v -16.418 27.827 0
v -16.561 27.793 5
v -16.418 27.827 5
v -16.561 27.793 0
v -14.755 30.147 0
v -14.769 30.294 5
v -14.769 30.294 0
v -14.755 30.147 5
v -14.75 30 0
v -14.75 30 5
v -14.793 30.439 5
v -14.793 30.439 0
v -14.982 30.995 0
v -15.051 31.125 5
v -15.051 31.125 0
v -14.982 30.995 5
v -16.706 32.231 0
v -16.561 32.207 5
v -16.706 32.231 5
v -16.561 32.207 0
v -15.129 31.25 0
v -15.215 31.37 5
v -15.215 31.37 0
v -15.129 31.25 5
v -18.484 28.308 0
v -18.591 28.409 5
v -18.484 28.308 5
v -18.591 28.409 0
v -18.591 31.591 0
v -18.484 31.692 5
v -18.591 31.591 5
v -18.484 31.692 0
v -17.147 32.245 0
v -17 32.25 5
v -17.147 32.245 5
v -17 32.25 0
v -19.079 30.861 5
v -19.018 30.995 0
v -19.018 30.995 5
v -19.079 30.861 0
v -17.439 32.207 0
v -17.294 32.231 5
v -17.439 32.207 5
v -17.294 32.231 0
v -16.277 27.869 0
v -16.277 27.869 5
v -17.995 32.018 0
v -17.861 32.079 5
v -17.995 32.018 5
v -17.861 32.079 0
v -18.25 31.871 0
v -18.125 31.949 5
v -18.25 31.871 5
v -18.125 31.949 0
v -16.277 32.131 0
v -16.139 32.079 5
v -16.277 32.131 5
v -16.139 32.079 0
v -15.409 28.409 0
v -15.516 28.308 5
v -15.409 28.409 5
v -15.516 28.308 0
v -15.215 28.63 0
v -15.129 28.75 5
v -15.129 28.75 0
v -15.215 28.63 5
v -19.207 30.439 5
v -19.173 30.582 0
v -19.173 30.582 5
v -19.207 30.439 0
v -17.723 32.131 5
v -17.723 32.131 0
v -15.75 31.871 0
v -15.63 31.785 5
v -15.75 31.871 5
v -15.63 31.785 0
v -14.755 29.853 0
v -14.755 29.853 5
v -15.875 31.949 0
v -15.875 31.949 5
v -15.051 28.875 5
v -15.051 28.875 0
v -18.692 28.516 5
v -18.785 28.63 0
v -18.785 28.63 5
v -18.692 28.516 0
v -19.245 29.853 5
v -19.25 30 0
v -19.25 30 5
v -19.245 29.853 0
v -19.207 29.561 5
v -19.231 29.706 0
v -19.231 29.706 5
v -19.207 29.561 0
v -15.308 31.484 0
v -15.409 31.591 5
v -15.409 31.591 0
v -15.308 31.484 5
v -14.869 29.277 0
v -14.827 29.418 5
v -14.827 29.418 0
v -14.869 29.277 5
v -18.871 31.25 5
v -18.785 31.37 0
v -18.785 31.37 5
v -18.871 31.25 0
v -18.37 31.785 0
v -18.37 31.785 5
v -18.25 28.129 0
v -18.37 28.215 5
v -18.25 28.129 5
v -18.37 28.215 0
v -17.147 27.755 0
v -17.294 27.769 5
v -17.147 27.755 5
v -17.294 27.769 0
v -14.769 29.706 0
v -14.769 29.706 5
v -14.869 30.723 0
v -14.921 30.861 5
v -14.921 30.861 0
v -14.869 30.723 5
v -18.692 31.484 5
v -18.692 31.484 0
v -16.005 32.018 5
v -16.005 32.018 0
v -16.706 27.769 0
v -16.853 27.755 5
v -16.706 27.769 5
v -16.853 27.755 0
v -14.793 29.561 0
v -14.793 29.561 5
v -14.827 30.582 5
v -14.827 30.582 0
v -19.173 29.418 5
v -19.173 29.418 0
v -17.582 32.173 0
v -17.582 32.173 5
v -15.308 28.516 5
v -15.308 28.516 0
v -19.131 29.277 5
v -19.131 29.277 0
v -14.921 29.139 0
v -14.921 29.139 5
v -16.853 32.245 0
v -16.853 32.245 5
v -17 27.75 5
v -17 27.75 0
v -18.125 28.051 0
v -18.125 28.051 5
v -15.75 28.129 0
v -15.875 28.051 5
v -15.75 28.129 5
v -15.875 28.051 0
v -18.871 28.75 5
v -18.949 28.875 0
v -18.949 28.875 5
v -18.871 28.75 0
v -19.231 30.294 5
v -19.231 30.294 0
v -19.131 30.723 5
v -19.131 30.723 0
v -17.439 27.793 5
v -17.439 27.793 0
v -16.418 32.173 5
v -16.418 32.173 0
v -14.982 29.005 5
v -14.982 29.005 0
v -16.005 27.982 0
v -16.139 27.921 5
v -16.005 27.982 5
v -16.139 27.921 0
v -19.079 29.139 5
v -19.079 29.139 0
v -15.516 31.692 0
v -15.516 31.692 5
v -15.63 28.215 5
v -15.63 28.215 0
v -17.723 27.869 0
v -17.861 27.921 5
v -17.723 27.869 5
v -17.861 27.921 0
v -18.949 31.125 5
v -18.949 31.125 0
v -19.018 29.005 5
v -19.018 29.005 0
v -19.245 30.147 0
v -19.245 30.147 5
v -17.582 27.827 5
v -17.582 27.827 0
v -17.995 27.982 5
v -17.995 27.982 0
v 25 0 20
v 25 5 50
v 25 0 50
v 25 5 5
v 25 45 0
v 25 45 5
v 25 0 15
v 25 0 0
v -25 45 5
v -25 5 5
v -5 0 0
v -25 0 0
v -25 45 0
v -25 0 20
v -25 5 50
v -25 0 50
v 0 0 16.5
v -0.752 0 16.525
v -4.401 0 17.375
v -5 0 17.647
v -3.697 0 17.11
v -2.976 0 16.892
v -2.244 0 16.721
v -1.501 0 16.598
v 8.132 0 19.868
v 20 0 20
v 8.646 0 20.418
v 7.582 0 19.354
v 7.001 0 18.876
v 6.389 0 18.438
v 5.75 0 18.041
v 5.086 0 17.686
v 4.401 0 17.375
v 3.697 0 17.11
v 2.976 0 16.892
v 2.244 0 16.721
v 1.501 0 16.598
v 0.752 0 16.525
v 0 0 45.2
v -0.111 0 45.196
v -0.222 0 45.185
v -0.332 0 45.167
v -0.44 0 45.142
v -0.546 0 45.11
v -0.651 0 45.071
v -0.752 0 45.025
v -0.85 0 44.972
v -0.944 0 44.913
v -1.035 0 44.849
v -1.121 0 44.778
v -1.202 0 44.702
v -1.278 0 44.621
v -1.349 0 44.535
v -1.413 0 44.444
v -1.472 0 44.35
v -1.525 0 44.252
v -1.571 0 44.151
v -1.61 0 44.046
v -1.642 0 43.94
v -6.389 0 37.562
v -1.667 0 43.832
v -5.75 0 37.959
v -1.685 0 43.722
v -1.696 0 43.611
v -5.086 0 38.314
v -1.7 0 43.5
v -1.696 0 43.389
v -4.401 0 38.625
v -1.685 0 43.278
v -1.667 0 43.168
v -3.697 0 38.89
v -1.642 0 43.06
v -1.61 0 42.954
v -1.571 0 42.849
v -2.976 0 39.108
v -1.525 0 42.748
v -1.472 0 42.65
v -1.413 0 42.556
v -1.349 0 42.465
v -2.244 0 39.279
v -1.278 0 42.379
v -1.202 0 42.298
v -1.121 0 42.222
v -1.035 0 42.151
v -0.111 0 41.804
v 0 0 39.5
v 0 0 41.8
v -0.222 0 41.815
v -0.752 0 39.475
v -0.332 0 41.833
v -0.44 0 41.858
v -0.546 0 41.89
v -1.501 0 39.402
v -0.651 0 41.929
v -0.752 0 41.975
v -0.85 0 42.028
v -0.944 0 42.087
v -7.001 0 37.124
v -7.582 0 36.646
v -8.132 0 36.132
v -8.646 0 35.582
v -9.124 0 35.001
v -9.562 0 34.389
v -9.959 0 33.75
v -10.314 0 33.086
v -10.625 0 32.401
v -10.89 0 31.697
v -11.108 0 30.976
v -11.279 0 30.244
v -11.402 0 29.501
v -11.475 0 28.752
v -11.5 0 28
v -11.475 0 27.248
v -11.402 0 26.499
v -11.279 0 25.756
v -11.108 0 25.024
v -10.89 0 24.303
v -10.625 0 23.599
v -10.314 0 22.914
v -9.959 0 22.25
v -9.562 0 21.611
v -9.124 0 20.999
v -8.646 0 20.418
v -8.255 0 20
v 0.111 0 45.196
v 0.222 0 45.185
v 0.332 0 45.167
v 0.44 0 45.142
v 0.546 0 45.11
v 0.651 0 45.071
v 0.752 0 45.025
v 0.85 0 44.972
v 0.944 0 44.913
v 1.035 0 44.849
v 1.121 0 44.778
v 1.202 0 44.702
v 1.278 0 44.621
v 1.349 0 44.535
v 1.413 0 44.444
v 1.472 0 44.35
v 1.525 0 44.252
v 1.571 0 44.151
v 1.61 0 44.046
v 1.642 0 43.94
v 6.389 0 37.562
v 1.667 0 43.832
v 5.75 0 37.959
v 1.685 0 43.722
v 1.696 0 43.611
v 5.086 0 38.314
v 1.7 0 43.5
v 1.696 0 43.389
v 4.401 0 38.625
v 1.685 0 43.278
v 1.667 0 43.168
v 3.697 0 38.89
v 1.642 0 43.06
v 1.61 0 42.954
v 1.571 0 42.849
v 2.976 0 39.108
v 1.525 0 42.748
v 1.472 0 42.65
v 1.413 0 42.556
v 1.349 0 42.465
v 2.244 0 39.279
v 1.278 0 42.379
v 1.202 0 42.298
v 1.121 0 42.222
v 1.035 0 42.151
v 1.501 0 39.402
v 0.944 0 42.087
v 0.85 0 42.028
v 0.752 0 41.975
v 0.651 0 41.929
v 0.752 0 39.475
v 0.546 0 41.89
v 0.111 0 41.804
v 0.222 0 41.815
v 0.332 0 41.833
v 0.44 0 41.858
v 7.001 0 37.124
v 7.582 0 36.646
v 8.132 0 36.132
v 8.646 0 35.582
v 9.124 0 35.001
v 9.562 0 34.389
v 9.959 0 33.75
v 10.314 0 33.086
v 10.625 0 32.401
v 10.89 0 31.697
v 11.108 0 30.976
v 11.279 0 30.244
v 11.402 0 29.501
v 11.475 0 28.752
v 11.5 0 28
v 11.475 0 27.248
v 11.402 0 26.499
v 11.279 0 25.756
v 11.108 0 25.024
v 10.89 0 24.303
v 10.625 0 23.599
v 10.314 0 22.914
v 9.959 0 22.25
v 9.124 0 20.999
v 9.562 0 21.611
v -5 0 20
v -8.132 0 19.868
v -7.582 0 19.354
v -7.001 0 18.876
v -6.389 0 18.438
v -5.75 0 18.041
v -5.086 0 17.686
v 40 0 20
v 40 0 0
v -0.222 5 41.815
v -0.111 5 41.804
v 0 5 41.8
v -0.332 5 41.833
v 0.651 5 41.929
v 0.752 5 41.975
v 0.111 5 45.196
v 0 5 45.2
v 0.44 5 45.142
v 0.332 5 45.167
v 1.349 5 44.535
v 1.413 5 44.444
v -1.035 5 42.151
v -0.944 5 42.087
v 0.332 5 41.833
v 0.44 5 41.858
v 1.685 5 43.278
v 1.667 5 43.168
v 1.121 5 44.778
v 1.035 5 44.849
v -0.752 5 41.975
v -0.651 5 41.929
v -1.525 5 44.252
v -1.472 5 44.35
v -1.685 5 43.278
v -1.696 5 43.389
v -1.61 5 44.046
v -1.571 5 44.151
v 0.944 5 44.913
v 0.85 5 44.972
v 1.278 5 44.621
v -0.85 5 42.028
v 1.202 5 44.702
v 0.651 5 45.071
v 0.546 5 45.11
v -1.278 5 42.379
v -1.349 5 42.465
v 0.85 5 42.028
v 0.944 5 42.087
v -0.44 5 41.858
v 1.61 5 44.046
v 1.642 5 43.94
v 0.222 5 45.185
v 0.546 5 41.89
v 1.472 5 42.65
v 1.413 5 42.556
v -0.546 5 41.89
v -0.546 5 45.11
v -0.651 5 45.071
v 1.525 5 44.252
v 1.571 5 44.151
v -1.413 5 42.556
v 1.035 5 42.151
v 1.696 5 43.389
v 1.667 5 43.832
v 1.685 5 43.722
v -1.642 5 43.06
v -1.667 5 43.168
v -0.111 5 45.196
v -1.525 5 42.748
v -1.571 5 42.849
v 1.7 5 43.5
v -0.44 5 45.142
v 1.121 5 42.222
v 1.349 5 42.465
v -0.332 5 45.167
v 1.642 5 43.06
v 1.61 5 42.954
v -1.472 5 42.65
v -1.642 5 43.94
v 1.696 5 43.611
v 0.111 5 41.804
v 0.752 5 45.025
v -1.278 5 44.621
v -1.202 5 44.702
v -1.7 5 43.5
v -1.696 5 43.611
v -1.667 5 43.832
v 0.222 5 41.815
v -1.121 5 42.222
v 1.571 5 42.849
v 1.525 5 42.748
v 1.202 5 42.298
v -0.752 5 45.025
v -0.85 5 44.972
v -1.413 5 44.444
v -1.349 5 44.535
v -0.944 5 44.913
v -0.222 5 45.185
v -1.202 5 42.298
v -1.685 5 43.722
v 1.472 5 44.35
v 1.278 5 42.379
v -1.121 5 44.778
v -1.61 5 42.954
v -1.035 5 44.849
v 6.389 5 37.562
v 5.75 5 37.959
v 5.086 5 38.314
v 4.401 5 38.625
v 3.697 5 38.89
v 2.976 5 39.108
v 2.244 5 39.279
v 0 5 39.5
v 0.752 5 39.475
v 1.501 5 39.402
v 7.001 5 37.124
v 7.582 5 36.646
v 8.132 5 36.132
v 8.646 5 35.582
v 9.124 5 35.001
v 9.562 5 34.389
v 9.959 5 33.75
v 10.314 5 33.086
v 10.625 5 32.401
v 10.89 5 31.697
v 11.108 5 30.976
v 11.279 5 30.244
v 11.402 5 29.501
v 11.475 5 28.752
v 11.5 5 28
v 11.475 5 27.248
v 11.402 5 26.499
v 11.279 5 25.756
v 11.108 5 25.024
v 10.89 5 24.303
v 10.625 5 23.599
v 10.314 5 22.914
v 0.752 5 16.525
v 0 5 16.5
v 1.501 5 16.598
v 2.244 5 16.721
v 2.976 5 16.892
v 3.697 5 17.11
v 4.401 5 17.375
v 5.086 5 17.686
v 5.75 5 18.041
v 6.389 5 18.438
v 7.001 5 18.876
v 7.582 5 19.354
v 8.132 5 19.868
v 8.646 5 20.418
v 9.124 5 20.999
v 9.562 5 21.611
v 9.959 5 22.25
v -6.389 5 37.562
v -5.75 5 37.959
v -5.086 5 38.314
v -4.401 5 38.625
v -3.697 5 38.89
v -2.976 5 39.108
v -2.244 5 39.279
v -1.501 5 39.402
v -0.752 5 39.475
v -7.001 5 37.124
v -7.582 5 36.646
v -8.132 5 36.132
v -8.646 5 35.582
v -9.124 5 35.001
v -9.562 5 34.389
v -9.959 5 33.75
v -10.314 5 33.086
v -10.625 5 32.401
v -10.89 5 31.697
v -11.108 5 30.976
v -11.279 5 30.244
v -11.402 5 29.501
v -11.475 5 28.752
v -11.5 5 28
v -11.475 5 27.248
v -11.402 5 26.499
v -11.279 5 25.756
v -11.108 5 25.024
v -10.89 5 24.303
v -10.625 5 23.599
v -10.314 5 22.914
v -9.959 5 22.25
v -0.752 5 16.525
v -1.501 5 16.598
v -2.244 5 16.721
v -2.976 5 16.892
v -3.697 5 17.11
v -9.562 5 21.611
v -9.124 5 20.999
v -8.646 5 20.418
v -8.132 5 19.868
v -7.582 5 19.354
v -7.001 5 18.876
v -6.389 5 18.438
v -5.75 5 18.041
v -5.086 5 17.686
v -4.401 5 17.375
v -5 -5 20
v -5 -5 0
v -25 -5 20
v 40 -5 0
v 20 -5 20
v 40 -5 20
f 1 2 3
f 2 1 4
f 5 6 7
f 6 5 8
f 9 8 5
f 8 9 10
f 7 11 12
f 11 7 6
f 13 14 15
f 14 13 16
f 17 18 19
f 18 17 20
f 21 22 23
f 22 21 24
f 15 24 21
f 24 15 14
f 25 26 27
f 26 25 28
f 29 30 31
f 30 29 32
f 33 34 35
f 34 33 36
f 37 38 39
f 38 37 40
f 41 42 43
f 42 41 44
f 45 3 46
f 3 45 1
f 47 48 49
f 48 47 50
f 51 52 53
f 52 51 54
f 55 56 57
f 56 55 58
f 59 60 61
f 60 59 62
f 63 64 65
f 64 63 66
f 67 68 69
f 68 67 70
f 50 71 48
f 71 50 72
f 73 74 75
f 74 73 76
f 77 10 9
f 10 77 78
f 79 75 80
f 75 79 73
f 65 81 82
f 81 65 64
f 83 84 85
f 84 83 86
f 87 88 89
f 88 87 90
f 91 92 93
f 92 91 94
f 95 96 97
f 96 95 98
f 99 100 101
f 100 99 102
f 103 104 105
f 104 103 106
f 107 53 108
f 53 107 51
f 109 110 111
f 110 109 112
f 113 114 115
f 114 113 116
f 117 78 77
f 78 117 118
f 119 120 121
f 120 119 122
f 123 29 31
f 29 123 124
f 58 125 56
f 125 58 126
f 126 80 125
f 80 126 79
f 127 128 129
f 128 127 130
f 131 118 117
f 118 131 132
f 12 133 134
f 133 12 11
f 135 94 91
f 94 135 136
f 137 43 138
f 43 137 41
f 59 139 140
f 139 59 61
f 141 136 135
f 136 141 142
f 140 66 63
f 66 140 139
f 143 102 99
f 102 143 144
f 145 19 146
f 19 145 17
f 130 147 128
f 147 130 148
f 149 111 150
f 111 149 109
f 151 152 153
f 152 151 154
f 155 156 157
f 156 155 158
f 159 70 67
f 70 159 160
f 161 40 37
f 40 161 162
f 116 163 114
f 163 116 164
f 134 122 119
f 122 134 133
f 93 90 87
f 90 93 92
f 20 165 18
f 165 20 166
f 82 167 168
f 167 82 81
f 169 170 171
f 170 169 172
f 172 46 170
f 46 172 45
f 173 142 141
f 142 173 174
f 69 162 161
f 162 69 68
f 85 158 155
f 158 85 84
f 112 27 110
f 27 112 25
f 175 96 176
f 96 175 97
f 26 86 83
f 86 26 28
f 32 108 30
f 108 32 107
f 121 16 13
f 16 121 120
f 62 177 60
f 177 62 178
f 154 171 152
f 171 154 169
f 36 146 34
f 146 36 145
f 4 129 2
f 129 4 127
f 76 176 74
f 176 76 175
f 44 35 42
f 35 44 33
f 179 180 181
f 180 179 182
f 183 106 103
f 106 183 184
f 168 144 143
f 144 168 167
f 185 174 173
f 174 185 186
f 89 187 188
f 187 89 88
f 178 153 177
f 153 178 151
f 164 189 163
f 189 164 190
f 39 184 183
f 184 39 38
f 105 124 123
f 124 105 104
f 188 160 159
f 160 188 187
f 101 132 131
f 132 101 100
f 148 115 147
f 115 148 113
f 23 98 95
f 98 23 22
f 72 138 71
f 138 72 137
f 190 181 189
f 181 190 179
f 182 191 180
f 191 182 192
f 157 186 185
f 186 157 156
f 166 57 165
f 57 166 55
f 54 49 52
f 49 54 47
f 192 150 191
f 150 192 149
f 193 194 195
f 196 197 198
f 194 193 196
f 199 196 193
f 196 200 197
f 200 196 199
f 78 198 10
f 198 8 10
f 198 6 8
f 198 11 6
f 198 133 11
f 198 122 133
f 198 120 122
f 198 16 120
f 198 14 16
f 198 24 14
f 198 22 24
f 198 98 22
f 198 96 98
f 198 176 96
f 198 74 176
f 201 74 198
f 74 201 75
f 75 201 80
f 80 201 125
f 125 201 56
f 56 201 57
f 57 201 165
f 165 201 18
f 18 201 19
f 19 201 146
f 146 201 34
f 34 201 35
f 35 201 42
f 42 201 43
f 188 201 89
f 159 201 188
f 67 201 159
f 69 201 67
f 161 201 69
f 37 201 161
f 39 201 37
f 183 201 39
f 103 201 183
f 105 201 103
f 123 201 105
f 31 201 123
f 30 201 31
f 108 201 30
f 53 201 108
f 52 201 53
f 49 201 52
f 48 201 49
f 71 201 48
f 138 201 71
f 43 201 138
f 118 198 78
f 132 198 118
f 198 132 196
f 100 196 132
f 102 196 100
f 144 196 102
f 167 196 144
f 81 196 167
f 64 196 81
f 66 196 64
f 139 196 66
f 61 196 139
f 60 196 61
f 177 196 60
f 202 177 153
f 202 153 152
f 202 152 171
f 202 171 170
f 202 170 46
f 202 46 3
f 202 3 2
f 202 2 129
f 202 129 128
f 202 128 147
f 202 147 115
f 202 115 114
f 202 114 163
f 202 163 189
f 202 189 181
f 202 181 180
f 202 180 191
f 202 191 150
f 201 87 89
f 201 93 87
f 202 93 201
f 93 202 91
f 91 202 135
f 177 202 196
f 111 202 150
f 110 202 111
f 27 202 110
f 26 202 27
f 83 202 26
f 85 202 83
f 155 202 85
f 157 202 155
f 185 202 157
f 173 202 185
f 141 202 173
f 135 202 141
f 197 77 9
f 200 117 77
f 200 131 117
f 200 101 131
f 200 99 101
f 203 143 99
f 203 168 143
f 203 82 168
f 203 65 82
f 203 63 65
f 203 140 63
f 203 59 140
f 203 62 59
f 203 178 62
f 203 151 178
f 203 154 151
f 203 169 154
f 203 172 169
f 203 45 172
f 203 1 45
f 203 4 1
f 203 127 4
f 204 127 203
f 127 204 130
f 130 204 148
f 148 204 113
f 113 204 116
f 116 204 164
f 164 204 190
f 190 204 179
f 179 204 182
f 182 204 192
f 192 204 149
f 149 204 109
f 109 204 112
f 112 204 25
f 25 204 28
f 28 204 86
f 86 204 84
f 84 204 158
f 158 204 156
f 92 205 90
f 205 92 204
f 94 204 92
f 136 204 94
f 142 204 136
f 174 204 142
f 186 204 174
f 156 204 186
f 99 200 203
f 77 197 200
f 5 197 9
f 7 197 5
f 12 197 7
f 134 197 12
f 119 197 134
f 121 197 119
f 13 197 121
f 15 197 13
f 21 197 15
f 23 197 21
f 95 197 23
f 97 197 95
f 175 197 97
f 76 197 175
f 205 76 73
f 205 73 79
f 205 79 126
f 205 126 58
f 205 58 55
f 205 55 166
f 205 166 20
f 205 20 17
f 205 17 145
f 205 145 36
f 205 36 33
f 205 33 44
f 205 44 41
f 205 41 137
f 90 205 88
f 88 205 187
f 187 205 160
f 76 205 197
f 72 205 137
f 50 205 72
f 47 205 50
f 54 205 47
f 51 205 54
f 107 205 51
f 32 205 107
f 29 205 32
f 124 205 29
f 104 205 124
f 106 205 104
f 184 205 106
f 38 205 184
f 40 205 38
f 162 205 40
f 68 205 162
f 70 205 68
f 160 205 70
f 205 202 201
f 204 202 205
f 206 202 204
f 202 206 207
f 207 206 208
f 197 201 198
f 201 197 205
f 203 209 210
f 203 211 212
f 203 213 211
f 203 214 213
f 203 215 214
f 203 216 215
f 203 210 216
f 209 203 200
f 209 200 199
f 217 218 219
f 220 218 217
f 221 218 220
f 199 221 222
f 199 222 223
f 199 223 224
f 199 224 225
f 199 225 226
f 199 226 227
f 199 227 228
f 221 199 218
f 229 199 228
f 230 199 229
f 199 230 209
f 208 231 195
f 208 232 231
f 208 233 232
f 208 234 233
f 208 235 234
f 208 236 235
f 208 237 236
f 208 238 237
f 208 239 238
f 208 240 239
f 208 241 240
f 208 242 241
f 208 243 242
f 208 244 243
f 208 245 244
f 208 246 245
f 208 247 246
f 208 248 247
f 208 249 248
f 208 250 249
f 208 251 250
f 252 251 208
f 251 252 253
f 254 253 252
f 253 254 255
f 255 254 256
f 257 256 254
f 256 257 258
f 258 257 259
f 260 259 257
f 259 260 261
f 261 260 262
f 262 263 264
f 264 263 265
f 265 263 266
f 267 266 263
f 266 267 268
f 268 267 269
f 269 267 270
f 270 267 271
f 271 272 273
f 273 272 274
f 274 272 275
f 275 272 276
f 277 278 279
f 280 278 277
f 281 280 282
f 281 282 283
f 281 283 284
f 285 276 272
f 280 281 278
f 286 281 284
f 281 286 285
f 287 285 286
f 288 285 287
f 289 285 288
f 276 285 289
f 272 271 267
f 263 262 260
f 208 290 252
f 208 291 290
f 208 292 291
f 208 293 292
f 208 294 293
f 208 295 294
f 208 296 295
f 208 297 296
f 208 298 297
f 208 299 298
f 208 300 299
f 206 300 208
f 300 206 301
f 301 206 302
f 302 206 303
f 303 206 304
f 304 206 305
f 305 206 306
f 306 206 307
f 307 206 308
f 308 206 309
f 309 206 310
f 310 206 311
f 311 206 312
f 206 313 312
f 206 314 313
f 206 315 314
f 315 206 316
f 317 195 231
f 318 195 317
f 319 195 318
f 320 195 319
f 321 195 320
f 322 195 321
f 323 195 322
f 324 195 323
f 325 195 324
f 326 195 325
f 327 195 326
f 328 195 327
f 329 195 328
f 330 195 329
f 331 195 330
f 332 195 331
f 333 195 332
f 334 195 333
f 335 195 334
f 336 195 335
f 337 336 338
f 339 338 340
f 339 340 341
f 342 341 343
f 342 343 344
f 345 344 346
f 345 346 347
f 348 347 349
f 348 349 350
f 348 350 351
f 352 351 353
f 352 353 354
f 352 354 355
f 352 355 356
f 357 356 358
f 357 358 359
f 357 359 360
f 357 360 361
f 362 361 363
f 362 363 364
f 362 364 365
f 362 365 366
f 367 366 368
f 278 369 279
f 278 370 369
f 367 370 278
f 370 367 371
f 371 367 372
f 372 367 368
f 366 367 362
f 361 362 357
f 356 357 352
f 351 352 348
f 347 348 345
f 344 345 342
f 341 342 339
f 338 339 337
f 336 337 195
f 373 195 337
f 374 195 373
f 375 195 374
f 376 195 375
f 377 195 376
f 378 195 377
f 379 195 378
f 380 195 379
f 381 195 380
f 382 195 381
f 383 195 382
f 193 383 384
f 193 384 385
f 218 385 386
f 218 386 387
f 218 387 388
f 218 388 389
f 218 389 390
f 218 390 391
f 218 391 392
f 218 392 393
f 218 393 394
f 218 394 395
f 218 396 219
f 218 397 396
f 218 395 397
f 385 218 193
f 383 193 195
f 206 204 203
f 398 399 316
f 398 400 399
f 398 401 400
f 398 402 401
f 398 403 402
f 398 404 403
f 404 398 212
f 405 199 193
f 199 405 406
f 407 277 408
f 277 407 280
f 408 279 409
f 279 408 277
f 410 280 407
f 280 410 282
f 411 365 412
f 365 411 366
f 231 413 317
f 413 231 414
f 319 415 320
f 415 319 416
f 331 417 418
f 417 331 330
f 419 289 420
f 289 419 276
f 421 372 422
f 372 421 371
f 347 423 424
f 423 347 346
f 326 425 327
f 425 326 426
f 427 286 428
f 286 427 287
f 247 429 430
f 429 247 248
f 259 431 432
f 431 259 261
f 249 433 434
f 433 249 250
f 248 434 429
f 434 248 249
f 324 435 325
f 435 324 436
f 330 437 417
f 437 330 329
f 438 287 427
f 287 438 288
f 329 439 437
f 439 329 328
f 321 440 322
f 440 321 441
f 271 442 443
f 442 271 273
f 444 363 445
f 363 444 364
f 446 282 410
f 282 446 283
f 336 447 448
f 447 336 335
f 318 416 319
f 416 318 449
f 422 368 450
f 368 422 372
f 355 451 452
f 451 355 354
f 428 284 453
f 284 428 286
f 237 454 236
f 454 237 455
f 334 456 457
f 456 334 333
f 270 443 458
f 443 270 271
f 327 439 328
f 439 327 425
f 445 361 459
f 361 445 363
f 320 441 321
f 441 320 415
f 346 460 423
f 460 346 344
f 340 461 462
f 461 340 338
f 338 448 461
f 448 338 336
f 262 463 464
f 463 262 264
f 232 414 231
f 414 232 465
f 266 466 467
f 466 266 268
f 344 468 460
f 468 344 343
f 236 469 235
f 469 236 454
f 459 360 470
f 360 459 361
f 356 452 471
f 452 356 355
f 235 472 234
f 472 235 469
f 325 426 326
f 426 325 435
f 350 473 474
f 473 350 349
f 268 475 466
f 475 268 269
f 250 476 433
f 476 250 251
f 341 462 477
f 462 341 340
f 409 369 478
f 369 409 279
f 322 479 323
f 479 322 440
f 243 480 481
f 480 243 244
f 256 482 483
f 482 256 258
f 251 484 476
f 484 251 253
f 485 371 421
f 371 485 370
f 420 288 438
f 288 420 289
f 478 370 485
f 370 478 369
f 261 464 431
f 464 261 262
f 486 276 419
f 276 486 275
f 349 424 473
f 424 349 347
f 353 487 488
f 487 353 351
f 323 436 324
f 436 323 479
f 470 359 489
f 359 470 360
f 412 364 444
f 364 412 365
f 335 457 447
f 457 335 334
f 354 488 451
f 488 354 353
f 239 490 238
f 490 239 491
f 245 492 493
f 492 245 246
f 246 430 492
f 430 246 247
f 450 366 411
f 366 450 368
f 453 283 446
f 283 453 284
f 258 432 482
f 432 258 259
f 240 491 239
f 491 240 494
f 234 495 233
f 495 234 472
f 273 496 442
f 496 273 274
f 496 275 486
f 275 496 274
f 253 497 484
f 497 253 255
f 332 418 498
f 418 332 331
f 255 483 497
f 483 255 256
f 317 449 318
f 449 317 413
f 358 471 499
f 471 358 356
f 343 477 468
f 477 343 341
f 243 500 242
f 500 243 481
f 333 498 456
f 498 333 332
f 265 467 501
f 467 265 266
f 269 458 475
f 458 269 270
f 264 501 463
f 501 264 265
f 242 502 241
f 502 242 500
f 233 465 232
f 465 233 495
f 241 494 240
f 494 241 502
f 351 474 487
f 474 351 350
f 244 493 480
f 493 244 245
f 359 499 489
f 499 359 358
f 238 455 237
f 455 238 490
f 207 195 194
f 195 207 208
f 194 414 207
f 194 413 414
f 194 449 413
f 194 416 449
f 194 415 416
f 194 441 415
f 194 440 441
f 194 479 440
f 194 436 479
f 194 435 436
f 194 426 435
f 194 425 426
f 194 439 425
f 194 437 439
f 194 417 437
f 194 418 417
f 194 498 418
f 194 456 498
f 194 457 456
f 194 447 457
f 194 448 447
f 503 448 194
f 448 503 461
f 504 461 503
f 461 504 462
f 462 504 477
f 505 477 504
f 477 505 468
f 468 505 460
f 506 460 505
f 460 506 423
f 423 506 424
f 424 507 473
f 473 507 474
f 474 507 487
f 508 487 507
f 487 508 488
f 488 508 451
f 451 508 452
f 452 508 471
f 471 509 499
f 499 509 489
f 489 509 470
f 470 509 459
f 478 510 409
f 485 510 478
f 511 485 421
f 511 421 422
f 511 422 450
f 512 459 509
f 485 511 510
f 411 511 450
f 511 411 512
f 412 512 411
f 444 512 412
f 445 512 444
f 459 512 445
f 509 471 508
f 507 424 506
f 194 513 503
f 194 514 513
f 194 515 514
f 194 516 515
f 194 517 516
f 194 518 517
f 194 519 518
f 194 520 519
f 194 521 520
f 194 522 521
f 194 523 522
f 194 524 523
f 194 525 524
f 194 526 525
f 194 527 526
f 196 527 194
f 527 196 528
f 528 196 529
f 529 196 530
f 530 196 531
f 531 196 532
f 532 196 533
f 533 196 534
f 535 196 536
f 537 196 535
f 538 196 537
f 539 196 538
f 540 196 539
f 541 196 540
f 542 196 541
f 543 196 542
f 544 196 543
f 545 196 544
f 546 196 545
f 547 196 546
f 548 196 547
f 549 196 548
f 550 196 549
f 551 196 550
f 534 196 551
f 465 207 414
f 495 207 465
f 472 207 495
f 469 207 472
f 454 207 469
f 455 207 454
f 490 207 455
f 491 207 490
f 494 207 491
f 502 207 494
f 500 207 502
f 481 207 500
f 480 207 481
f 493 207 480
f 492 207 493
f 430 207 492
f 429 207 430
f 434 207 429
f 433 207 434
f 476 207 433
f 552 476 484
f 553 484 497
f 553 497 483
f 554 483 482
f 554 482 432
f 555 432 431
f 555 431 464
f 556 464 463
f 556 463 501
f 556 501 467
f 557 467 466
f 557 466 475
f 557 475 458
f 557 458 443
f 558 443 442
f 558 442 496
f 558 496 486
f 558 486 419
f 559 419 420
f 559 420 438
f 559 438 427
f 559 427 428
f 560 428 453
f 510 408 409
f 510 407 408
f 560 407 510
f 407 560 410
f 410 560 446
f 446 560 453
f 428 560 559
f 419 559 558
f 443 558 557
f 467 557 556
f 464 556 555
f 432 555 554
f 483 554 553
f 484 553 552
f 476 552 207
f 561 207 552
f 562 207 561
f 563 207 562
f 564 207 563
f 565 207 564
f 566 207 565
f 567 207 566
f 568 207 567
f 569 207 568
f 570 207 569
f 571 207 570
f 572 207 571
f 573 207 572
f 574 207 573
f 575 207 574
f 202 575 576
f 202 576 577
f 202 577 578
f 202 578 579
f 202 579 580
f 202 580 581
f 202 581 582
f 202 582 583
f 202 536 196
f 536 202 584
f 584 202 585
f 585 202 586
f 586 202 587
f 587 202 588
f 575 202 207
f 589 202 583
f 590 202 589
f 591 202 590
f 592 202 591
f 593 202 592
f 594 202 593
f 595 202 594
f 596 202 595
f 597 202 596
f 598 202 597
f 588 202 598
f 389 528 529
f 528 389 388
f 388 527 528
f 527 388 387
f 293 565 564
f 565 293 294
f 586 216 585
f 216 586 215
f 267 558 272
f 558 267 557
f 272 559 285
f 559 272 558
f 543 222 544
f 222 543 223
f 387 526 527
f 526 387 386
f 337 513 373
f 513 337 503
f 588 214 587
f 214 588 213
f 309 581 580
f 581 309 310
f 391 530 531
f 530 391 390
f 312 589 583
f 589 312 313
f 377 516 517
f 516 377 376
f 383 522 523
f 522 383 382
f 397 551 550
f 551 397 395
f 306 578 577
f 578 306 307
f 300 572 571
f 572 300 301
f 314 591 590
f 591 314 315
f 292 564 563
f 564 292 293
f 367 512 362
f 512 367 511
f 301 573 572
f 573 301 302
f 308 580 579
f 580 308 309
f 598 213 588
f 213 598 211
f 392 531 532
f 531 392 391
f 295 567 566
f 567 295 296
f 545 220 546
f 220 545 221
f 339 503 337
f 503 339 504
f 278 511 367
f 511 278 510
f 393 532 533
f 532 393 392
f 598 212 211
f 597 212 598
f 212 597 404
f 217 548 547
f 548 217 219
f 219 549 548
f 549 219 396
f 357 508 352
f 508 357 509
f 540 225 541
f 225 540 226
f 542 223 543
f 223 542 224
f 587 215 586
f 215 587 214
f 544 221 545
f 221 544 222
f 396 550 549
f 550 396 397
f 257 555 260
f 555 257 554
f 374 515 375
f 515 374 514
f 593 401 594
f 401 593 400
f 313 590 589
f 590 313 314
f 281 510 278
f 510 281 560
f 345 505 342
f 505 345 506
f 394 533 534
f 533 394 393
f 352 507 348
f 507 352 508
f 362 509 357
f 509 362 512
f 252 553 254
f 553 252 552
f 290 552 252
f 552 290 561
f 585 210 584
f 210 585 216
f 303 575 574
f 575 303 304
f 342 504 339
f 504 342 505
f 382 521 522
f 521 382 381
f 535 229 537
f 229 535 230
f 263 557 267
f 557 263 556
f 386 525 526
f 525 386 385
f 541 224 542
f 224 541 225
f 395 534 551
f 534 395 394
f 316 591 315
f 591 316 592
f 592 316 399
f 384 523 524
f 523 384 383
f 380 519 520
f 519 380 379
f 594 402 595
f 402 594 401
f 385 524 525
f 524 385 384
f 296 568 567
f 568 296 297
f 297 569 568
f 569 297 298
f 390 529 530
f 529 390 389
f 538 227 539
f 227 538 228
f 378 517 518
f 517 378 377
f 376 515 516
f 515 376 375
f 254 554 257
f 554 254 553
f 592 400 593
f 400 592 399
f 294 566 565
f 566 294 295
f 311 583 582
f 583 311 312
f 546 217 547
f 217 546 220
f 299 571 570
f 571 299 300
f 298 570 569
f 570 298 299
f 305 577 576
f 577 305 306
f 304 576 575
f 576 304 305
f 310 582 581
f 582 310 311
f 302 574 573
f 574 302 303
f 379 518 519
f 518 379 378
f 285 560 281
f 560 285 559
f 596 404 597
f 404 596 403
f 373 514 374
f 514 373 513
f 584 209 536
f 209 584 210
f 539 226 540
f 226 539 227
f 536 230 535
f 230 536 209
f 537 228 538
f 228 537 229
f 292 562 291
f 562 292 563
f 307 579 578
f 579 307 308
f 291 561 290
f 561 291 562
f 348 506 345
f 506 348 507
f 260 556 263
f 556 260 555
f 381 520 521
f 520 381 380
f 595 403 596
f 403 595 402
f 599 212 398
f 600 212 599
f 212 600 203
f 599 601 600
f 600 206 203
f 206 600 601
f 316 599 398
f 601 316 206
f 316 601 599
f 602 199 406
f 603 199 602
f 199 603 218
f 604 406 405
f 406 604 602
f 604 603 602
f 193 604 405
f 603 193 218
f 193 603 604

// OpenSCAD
// L-shaped mounting bracket for NEMA 17 stepper motor
// Print orientation: base plate on bed, motor plate building up in +Z

// ---------------- Parameters ----------------
plate_x       = 25;    // base plate half-width (X)
plate_y       = 45;    // base plate length (Y)
plate_t       = 5;     // base plate thickness (Z)

motor_h       = 50;    // motor plate height (Z)
motor_w       = 5;     // motor plate thickness (Y)

boss_d        = 23;    // motor boss hole diameter
boss_x        = 0;     // boss hole centre X
boss_z        = 28;    // boss hole centre Z

screw_d       = 3.4;   // M3 screw hole diameter
screw_pattern = 31;    // square pitch for screw holes
screw_count   = 4;     // number of screw holes

gusset_t      = 5;     // gusset thickness (X)
gusset_leg    = 20;    // gusset right-triangle leg length (Y and Z)
gusset_x      = [-25, 20]; // gusset start X positions

eps           = 0.5;   // cutter overshoot past faces

$fn = 96;

// ---------------- Model ----------------
union() {
    // Base plate with M4 through-holes
    difference() {
        translate([-plate_x, 0, 0])
            cube([plate_x * 2, plate_y, plate_t]);
        for (h = [0, 1])
            translate([-17, 30, h * plate_t - eps])
                cylinder(d = 4.5, h = plate_t + 2 * eps);
    }

    // Vertical motor plate with boss hole and M3 screw holes
    difference() {
        translate([-plate_x, 0, 0])
            cube([plate_x * 2, motor_w, motor_h]);
        translate([boss_x, -eps, boss_z])
            rotate([-90, 0, 0])
                cylinder(d = boss_d, h = motor_w + 2 * eps);
        for (i = [0 : screw_count - 1]) {
            a = atan2(sin(i * 90), cos(i * 90));
            translate([boss_x, motor_w / 2 - screw_pattern / 2,
                       boss_z + screw_pattern / 2])
                rotate([0, 90, a])
                    cylinder(d = screw_d, h = screw_pattern + 2 * eps);
        }
    }

    // Triangular gussets flush with left and right edges
    for (gx = gusset_x)
        translate([gx, 0, 0])
            rotate([90, 0, 0])
                linear_extrude(height = gusset_t)
                    polygon(points = [
                        [gusset_leg, gusset_leg],
                        [gusset_leg, 0],
                        [0, gusset_leg]
                    ]);
}
